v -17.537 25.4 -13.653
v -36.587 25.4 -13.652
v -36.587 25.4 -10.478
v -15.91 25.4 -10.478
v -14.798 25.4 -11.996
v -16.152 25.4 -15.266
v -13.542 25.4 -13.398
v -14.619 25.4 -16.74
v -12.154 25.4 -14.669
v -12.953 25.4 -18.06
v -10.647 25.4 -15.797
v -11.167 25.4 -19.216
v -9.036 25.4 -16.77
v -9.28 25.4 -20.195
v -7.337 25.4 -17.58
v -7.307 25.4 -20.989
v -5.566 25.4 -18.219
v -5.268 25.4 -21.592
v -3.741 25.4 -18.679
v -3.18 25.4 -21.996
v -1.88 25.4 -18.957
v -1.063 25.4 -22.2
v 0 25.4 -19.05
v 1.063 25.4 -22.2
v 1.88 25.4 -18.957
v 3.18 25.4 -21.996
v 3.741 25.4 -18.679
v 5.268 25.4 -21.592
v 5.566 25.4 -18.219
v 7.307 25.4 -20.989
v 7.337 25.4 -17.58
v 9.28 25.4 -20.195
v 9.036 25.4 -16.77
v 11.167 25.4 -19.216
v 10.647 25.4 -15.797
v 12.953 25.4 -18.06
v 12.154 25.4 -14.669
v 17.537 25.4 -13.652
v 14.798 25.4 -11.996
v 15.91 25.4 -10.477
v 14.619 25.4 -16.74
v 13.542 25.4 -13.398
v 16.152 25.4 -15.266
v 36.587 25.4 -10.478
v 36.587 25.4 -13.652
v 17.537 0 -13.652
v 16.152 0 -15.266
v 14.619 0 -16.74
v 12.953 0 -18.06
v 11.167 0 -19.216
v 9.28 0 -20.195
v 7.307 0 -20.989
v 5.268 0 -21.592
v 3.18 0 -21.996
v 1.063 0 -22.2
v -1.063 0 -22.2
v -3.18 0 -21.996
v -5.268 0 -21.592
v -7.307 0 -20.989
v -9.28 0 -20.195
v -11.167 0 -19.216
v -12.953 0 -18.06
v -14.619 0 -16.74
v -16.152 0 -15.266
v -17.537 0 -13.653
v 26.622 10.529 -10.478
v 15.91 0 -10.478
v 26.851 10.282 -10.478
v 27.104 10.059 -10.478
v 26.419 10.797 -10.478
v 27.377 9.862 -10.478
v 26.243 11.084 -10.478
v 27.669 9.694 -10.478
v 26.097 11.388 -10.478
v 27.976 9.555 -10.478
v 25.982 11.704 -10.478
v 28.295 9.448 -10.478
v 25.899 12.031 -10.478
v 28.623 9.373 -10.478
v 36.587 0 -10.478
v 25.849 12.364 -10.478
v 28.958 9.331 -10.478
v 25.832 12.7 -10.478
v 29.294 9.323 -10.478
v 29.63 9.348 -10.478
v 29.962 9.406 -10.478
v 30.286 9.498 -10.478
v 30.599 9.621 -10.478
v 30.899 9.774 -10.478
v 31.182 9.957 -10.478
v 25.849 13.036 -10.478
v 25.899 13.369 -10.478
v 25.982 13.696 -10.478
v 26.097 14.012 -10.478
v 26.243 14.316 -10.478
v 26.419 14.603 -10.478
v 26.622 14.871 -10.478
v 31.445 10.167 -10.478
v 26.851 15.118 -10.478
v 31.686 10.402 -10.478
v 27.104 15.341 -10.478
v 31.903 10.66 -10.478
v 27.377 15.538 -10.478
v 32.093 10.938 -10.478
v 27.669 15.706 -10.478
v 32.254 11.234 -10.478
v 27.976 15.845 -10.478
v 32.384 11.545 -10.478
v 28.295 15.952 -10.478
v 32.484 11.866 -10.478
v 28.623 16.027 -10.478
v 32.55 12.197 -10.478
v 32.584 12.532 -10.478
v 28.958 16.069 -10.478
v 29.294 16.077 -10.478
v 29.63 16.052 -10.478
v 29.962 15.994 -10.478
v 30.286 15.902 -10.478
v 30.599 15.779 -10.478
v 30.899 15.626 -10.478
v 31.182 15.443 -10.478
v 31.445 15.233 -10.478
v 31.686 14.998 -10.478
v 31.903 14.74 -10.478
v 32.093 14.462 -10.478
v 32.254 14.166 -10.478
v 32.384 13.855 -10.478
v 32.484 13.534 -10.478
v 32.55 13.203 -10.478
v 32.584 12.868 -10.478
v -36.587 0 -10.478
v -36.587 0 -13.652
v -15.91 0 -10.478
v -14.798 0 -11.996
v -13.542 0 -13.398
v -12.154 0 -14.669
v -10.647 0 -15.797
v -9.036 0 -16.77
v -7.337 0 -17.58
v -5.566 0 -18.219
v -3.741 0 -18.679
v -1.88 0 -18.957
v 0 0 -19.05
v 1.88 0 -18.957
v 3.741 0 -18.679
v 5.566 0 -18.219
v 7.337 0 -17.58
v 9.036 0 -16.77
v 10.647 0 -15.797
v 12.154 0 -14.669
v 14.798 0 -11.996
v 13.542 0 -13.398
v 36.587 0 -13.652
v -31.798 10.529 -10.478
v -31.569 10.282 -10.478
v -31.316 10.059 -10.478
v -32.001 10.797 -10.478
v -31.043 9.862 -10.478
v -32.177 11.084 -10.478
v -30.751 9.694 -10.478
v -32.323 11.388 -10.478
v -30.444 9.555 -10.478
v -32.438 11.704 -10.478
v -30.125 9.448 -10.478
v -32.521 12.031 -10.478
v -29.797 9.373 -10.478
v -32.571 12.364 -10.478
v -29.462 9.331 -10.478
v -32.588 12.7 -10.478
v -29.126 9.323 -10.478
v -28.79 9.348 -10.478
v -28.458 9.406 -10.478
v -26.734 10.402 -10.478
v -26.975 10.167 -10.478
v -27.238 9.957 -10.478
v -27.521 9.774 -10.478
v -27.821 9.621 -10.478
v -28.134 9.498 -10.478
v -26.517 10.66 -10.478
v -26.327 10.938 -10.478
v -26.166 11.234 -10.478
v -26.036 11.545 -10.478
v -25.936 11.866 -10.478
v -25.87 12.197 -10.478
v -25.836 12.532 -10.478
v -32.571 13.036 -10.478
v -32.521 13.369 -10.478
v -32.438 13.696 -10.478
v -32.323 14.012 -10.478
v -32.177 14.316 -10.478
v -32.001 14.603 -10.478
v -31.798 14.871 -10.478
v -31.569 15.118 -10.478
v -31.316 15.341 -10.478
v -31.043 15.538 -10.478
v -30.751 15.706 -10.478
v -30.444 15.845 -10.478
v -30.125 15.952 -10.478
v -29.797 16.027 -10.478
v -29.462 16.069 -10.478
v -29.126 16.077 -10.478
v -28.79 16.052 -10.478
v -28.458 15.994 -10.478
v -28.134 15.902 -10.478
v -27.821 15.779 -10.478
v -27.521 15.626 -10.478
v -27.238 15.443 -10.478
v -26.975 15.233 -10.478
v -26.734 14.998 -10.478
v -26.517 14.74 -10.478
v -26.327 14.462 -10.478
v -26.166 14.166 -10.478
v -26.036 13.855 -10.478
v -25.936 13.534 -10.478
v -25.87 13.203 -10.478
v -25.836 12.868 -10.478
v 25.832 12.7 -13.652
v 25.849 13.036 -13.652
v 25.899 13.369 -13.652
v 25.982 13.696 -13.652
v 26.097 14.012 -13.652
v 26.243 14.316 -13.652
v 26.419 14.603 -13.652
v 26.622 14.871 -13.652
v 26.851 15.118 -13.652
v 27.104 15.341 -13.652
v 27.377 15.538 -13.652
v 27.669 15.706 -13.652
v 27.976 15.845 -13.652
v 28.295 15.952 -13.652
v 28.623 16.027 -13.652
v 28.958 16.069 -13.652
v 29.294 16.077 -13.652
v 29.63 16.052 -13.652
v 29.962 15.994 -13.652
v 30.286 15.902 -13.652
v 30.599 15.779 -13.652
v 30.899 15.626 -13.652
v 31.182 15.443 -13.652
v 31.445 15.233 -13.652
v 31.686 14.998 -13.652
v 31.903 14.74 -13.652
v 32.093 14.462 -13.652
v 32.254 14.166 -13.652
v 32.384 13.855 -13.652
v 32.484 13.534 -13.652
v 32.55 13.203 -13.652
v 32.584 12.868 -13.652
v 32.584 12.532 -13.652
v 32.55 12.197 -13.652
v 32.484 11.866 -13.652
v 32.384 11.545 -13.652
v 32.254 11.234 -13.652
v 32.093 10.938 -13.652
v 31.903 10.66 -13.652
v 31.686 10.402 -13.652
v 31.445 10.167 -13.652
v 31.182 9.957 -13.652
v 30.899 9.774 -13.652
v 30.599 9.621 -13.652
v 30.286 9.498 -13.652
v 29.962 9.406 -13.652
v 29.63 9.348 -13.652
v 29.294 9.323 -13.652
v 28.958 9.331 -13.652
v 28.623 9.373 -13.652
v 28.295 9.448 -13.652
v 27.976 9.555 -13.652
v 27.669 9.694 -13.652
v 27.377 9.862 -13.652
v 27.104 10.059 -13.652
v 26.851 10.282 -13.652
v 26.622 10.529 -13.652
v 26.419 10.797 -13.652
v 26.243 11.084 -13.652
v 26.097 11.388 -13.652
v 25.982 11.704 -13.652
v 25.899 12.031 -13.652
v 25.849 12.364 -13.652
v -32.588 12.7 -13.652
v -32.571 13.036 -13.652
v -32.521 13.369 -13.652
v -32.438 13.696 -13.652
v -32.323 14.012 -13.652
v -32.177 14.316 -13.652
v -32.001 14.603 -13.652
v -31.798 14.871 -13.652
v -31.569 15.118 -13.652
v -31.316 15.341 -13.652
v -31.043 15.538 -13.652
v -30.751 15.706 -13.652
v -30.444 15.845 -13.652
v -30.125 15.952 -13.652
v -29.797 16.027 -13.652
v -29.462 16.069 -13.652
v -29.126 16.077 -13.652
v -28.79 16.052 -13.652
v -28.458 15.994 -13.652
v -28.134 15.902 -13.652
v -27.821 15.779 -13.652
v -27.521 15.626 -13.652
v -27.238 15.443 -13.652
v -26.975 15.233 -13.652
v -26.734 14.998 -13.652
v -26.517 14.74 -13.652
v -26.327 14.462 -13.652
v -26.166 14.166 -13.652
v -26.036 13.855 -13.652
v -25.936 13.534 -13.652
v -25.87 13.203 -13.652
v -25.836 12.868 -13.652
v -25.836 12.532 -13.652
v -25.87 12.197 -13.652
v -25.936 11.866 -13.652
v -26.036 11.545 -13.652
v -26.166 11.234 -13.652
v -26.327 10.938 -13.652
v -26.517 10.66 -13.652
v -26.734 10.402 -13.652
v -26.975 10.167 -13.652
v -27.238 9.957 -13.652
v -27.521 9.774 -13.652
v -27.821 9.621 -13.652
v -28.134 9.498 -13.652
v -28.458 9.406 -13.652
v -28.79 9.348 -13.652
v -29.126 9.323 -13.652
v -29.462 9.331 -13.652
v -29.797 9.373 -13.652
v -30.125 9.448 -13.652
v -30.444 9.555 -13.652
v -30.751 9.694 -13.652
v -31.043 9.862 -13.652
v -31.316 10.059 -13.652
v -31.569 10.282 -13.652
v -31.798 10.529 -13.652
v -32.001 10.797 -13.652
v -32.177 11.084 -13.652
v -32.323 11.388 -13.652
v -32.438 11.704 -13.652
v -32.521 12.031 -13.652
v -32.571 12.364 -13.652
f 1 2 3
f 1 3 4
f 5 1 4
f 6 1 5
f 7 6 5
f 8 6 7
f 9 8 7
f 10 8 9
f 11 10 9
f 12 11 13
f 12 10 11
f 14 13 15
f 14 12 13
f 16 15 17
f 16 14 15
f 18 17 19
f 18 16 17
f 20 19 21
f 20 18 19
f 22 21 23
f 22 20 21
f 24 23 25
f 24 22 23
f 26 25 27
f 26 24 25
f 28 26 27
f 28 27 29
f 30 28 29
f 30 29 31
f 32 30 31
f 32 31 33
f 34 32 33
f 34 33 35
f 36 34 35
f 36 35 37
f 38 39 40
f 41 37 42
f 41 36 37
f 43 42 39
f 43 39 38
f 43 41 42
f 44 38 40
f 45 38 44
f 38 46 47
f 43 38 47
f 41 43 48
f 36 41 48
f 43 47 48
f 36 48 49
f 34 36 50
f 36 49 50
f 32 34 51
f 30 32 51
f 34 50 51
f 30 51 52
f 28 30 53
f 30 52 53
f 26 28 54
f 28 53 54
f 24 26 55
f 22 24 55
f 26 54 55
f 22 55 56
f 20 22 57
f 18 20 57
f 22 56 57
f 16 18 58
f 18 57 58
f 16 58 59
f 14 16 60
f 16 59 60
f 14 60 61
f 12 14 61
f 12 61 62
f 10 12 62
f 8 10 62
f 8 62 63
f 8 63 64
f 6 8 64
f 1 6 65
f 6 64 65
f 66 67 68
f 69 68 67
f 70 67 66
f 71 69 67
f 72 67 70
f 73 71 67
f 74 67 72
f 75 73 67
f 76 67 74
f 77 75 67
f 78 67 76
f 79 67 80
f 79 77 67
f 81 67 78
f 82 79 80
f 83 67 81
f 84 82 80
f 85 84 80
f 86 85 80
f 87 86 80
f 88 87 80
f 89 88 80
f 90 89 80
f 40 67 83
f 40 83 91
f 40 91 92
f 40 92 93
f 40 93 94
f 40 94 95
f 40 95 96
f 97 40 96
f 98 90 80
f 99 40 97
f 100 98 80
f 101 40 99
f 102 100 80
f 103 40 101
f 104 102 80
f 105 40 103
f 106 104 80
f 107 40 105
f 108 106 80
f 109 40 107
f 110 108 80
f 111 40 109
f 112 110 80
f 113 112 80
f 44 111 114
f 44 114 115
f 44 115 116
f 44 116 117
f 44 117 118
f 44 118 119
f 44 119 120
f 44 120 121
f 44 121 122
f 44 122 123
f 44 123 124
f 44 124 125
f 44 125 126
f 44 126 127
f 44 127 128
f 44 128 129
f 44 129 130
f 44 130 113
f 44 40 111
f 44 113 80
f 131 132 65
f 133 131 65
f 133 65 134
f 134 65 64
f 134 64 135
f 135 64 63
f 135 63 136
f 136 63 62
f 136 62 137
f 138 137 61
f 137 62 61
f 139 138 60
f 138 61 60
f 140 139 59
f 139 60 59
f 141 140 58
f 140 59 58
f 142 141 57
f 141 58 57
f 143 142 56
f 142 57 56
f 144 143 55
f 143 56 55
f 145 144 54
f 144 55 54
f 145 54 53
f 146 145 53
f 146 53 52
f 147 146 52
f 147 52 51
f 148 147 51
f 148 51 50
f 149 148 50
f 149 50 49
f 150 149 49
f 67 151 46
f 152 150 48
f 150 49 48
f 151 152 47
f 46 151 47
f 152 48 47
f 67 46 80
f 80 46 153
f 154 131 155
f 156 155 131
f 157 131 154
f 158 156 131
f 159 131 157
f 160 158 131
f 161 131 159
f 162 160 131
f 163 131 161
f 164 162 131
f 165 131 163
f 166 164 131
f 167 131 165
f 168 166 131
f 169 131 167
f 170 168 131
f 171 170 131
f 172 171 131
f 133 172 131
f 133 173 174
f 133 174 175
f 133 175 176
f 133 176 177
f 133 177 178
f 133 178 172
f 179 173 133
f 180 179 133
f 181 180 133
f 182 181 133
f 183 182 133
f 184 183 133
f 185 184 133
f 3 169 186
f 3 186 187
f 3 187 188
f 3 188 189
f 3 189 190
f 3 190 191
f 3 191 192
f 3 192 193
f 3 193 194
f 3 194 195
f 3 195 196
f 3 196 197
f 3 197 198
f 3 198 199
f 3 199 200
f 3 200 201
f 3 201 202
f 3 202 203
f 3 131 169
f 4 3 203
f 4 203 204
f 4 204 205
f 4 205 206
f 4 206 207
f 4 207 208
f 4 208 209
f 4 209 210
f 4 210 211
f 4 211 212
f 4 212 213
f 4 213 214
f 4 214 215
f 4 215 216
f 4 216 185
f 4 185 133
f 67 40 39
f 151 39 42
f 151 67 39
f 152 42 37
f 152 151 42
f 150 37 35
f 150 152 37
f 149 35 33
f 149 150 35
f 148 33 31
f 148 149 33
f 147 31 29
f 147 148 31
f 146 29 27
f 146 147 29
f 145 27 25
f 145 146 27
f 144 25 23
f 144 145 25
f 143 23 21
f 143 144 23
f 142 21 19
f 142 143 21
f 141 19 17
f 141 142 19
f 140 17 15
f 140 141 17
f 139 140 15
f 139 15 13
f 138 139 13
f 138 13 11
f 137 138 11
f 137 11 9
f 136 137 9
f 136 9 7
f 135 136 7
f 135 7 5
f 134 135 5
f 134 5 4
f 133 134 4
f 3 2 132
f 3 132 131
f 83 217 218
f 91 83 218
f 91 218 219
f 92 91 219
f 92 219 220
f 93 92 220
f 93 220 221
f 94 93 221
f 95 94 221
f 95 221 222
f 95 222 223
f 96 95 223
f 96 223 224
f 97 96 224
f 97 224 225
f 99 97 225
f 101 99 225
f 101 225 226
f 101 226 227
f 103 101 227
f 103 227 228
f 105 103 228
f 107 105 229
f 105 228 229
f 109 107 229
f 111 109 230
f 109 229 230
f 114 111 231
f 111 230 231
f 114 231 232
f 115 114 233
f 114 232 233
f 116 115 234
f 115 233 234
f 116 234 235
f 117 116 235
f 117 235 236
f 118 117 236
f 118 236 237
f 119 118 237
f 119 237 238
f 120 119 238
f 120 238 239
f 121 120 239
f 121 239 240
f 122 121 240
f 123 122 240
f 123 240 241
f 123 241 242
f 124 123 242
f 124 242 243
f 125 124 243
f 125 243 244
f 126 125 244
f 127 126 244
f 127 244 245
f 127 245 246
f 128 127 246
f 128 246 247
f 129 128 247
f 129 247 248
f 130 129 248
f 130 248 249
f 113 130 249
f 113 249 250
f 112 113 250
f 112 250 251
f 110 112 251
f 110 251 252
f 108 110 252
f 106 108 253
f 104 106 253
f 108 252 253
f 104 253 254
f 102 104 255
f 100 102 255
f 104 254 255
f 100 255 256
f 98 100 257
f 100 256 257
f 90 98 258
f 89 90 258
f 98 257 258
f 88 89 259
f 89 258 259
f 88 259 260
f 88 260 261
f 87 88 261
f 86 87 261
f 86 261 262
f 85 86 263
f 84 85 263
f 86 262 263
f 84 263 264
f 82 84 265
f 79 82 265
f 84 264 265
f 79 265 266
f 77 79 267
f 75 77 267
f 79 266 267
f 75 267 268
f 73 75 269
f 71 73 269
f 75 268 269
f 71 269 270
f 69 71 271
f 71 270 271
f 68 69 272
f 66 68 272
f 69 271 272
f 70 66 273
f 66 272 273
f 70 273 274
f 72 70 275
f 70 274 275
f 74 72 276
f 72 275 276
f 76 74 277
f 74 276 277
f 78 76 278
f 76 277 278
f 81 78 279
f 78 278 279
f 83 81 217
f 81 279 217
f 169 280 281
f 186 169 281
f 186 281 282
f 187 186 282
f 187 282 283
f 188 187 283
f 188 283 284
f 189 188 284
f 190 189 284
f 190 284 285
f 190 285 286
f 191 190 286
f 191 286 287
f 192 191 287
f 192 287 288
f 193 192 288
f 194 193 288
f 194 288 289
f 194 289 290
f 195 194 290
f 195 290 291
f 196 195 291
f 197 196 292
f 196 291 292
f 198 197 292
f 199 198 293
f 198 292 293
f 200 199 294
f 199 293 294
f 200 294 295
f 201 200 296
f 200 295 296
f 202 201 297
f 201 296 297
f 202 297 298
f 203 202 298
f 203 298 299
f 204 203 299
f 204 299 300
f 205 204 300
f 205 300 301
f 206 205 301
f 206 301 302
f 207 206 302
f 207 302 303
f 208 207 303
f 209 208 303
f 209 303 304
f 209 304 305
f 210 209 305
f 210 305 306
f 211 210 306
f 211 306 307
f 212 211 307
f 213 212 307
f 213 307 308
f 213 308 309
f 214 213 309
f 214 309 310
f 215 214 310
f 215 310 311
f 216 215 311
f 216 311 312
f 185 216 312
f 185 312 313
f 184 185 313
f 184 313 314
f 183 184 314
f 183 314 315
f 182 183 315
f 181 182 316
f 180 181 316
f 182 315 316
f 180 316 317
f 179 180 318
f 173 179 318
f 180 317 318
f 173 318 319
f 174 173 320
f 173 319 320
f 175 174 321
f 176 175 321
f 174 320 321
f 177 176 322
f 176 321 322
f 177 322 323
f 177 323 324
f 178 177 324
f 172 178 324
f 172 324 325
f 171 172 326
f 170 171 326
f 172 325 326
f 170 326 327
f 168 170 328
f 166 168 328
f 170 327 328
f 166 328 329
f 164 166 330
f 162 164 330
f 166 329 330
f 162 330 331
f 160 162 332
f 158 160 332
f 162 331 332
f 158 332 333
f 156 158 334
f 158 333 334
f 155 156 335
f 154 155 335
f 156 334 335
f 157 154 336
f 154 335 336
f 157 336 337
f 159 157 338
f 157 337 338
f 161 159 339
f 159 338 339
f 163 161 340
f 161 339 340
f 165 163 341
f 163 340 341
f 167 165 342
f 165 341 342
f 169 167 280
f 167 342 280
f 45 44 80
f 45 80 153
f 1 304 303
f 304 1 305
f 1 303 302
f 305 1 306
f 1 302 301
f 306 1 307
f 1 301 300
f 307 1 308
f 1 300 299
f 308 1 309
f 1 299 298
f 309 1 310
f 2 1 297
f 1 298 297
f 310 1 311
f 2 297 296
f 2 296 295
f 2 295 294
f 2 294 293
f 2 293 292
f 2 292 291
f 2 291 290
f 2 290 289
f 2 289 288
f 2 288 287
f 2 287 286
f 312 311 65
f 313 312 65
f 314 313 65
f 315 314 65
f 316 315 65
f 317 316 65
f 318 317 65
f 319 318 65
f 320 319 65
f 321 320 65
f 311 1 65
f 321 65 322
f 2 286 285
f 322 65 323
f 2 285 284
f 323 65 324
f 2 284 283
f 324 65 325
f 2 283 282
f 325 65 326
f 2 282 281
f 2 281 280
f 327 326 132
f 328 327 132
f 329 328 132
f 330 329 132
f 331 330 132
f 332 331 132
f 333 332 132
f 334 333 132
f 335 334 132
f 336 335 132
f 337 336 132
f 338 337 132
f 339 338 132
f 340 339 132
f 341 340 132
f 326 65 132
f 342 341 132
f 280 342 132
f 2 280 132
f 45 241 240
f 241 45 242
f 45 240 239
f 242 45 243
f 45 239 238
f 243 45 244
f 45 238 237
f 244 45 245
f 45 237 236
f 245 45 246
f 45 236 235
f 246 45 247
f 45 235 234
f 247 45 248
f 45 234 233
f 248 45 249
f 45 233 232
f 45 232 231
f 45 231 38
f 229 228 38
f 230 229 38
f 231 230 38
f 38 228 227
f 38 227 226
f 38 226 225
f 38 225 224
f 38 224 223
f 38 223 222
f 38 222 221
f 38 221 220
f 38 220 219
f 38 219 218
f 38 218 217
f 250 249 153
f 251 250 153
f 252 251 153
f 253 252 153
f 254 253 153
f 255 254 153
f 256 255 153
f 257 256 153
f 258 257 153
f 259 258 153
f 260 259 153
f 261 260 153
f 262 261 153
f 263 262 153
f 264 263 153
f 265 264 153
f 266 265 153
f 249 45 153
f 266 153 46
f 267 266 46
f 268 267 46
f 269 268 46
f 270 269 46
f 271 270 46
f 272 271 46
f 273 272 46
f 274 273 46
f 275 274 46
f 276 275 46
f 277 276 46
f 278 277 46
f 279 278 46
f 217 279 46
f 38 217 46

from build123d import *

# Parameters (mm, degrees)
SKETCH1_R           = 19.05
BOSS_EXTRUDE1_DEPTH = 25.4
SKETCH2_R           = 3.3782
CUT_EXTRUDE1_DEPTH  = 36.8775
SKETCH3_W           = 85.242997218
SKETCH3_H           = 34.152222548
CUT_EXTRUDE2_DEPTH  = 26.4


with BuildPart() as part:
    # Sketch1 → Boss-Extrude1 (new body)
    with BuildSketch(Plane(origin=(0, 0, 0), x_dir=(1, 0, 0), z_dir=(0, 1, 0))):
        with BuildLine():
            Line((36.587384889, 13.6525), (17.537384889, 13.6525))
            ThreePointArc((17.537384889, 13.6525), (0, 22.225), (-17.537384889, 13.6525))
            Line((-17.537384889, 13.6525), (-36.587384889, 13.6525))
            Line((-36.587384889, 13.6525), (-36.587384889, 4.1275))
            Line((-36.587384889, 4.1275), (-21.838369187, 4.1275))
            ThreePointArc((-21.838369187, 4.1275), (0, -22.225), (21.838369187, 4.1275))
            Line((21.838369187, 4.1275), (36.587384889, 4.1275))
            Line((36.587384889, 4.1275), (36.587384889, 13.6525))
        make_face()
        Circle(SKETCH1_R, mode=Mode.SUBTRACT)
    extrude(amount=BOSS_EXTRUDE1_DEPTH)

    # Sketch2 → Cut-Extrude1 (cut, through all)
    with BuildSketch(Plane(origin=(0, 0, -13.6525), x_dir=(-1, 0, 0), z_dir=(0, 0, -1))):
        with Locations((29.21, 12.7)):
            Circle(SKETCH2_R)
        with Locations((-29.21, 12.7)):
            Circle(SKETCH2_R)
    extrude(amount=-CUT_EXTRUDE1_DEPTH, mode=Mode.SUBTRACT)

    # Sketch3 → Cut-Extrude2 (cut, through all)
    with BuildSketch(Plane(origin=(0, 25.4, 0), x_dir=(1, 0, 0), z_dir=(0, 1, 0))):
        with Locations((-0.146640147, -6.598611274)):
            Rectangle(SKETCH3_W, SKETCH3_H)
    extrude(amount=-CUT_EXTRUDE2_DEPTH, mode=Mode.SUBTRACT)


solid = part.part
